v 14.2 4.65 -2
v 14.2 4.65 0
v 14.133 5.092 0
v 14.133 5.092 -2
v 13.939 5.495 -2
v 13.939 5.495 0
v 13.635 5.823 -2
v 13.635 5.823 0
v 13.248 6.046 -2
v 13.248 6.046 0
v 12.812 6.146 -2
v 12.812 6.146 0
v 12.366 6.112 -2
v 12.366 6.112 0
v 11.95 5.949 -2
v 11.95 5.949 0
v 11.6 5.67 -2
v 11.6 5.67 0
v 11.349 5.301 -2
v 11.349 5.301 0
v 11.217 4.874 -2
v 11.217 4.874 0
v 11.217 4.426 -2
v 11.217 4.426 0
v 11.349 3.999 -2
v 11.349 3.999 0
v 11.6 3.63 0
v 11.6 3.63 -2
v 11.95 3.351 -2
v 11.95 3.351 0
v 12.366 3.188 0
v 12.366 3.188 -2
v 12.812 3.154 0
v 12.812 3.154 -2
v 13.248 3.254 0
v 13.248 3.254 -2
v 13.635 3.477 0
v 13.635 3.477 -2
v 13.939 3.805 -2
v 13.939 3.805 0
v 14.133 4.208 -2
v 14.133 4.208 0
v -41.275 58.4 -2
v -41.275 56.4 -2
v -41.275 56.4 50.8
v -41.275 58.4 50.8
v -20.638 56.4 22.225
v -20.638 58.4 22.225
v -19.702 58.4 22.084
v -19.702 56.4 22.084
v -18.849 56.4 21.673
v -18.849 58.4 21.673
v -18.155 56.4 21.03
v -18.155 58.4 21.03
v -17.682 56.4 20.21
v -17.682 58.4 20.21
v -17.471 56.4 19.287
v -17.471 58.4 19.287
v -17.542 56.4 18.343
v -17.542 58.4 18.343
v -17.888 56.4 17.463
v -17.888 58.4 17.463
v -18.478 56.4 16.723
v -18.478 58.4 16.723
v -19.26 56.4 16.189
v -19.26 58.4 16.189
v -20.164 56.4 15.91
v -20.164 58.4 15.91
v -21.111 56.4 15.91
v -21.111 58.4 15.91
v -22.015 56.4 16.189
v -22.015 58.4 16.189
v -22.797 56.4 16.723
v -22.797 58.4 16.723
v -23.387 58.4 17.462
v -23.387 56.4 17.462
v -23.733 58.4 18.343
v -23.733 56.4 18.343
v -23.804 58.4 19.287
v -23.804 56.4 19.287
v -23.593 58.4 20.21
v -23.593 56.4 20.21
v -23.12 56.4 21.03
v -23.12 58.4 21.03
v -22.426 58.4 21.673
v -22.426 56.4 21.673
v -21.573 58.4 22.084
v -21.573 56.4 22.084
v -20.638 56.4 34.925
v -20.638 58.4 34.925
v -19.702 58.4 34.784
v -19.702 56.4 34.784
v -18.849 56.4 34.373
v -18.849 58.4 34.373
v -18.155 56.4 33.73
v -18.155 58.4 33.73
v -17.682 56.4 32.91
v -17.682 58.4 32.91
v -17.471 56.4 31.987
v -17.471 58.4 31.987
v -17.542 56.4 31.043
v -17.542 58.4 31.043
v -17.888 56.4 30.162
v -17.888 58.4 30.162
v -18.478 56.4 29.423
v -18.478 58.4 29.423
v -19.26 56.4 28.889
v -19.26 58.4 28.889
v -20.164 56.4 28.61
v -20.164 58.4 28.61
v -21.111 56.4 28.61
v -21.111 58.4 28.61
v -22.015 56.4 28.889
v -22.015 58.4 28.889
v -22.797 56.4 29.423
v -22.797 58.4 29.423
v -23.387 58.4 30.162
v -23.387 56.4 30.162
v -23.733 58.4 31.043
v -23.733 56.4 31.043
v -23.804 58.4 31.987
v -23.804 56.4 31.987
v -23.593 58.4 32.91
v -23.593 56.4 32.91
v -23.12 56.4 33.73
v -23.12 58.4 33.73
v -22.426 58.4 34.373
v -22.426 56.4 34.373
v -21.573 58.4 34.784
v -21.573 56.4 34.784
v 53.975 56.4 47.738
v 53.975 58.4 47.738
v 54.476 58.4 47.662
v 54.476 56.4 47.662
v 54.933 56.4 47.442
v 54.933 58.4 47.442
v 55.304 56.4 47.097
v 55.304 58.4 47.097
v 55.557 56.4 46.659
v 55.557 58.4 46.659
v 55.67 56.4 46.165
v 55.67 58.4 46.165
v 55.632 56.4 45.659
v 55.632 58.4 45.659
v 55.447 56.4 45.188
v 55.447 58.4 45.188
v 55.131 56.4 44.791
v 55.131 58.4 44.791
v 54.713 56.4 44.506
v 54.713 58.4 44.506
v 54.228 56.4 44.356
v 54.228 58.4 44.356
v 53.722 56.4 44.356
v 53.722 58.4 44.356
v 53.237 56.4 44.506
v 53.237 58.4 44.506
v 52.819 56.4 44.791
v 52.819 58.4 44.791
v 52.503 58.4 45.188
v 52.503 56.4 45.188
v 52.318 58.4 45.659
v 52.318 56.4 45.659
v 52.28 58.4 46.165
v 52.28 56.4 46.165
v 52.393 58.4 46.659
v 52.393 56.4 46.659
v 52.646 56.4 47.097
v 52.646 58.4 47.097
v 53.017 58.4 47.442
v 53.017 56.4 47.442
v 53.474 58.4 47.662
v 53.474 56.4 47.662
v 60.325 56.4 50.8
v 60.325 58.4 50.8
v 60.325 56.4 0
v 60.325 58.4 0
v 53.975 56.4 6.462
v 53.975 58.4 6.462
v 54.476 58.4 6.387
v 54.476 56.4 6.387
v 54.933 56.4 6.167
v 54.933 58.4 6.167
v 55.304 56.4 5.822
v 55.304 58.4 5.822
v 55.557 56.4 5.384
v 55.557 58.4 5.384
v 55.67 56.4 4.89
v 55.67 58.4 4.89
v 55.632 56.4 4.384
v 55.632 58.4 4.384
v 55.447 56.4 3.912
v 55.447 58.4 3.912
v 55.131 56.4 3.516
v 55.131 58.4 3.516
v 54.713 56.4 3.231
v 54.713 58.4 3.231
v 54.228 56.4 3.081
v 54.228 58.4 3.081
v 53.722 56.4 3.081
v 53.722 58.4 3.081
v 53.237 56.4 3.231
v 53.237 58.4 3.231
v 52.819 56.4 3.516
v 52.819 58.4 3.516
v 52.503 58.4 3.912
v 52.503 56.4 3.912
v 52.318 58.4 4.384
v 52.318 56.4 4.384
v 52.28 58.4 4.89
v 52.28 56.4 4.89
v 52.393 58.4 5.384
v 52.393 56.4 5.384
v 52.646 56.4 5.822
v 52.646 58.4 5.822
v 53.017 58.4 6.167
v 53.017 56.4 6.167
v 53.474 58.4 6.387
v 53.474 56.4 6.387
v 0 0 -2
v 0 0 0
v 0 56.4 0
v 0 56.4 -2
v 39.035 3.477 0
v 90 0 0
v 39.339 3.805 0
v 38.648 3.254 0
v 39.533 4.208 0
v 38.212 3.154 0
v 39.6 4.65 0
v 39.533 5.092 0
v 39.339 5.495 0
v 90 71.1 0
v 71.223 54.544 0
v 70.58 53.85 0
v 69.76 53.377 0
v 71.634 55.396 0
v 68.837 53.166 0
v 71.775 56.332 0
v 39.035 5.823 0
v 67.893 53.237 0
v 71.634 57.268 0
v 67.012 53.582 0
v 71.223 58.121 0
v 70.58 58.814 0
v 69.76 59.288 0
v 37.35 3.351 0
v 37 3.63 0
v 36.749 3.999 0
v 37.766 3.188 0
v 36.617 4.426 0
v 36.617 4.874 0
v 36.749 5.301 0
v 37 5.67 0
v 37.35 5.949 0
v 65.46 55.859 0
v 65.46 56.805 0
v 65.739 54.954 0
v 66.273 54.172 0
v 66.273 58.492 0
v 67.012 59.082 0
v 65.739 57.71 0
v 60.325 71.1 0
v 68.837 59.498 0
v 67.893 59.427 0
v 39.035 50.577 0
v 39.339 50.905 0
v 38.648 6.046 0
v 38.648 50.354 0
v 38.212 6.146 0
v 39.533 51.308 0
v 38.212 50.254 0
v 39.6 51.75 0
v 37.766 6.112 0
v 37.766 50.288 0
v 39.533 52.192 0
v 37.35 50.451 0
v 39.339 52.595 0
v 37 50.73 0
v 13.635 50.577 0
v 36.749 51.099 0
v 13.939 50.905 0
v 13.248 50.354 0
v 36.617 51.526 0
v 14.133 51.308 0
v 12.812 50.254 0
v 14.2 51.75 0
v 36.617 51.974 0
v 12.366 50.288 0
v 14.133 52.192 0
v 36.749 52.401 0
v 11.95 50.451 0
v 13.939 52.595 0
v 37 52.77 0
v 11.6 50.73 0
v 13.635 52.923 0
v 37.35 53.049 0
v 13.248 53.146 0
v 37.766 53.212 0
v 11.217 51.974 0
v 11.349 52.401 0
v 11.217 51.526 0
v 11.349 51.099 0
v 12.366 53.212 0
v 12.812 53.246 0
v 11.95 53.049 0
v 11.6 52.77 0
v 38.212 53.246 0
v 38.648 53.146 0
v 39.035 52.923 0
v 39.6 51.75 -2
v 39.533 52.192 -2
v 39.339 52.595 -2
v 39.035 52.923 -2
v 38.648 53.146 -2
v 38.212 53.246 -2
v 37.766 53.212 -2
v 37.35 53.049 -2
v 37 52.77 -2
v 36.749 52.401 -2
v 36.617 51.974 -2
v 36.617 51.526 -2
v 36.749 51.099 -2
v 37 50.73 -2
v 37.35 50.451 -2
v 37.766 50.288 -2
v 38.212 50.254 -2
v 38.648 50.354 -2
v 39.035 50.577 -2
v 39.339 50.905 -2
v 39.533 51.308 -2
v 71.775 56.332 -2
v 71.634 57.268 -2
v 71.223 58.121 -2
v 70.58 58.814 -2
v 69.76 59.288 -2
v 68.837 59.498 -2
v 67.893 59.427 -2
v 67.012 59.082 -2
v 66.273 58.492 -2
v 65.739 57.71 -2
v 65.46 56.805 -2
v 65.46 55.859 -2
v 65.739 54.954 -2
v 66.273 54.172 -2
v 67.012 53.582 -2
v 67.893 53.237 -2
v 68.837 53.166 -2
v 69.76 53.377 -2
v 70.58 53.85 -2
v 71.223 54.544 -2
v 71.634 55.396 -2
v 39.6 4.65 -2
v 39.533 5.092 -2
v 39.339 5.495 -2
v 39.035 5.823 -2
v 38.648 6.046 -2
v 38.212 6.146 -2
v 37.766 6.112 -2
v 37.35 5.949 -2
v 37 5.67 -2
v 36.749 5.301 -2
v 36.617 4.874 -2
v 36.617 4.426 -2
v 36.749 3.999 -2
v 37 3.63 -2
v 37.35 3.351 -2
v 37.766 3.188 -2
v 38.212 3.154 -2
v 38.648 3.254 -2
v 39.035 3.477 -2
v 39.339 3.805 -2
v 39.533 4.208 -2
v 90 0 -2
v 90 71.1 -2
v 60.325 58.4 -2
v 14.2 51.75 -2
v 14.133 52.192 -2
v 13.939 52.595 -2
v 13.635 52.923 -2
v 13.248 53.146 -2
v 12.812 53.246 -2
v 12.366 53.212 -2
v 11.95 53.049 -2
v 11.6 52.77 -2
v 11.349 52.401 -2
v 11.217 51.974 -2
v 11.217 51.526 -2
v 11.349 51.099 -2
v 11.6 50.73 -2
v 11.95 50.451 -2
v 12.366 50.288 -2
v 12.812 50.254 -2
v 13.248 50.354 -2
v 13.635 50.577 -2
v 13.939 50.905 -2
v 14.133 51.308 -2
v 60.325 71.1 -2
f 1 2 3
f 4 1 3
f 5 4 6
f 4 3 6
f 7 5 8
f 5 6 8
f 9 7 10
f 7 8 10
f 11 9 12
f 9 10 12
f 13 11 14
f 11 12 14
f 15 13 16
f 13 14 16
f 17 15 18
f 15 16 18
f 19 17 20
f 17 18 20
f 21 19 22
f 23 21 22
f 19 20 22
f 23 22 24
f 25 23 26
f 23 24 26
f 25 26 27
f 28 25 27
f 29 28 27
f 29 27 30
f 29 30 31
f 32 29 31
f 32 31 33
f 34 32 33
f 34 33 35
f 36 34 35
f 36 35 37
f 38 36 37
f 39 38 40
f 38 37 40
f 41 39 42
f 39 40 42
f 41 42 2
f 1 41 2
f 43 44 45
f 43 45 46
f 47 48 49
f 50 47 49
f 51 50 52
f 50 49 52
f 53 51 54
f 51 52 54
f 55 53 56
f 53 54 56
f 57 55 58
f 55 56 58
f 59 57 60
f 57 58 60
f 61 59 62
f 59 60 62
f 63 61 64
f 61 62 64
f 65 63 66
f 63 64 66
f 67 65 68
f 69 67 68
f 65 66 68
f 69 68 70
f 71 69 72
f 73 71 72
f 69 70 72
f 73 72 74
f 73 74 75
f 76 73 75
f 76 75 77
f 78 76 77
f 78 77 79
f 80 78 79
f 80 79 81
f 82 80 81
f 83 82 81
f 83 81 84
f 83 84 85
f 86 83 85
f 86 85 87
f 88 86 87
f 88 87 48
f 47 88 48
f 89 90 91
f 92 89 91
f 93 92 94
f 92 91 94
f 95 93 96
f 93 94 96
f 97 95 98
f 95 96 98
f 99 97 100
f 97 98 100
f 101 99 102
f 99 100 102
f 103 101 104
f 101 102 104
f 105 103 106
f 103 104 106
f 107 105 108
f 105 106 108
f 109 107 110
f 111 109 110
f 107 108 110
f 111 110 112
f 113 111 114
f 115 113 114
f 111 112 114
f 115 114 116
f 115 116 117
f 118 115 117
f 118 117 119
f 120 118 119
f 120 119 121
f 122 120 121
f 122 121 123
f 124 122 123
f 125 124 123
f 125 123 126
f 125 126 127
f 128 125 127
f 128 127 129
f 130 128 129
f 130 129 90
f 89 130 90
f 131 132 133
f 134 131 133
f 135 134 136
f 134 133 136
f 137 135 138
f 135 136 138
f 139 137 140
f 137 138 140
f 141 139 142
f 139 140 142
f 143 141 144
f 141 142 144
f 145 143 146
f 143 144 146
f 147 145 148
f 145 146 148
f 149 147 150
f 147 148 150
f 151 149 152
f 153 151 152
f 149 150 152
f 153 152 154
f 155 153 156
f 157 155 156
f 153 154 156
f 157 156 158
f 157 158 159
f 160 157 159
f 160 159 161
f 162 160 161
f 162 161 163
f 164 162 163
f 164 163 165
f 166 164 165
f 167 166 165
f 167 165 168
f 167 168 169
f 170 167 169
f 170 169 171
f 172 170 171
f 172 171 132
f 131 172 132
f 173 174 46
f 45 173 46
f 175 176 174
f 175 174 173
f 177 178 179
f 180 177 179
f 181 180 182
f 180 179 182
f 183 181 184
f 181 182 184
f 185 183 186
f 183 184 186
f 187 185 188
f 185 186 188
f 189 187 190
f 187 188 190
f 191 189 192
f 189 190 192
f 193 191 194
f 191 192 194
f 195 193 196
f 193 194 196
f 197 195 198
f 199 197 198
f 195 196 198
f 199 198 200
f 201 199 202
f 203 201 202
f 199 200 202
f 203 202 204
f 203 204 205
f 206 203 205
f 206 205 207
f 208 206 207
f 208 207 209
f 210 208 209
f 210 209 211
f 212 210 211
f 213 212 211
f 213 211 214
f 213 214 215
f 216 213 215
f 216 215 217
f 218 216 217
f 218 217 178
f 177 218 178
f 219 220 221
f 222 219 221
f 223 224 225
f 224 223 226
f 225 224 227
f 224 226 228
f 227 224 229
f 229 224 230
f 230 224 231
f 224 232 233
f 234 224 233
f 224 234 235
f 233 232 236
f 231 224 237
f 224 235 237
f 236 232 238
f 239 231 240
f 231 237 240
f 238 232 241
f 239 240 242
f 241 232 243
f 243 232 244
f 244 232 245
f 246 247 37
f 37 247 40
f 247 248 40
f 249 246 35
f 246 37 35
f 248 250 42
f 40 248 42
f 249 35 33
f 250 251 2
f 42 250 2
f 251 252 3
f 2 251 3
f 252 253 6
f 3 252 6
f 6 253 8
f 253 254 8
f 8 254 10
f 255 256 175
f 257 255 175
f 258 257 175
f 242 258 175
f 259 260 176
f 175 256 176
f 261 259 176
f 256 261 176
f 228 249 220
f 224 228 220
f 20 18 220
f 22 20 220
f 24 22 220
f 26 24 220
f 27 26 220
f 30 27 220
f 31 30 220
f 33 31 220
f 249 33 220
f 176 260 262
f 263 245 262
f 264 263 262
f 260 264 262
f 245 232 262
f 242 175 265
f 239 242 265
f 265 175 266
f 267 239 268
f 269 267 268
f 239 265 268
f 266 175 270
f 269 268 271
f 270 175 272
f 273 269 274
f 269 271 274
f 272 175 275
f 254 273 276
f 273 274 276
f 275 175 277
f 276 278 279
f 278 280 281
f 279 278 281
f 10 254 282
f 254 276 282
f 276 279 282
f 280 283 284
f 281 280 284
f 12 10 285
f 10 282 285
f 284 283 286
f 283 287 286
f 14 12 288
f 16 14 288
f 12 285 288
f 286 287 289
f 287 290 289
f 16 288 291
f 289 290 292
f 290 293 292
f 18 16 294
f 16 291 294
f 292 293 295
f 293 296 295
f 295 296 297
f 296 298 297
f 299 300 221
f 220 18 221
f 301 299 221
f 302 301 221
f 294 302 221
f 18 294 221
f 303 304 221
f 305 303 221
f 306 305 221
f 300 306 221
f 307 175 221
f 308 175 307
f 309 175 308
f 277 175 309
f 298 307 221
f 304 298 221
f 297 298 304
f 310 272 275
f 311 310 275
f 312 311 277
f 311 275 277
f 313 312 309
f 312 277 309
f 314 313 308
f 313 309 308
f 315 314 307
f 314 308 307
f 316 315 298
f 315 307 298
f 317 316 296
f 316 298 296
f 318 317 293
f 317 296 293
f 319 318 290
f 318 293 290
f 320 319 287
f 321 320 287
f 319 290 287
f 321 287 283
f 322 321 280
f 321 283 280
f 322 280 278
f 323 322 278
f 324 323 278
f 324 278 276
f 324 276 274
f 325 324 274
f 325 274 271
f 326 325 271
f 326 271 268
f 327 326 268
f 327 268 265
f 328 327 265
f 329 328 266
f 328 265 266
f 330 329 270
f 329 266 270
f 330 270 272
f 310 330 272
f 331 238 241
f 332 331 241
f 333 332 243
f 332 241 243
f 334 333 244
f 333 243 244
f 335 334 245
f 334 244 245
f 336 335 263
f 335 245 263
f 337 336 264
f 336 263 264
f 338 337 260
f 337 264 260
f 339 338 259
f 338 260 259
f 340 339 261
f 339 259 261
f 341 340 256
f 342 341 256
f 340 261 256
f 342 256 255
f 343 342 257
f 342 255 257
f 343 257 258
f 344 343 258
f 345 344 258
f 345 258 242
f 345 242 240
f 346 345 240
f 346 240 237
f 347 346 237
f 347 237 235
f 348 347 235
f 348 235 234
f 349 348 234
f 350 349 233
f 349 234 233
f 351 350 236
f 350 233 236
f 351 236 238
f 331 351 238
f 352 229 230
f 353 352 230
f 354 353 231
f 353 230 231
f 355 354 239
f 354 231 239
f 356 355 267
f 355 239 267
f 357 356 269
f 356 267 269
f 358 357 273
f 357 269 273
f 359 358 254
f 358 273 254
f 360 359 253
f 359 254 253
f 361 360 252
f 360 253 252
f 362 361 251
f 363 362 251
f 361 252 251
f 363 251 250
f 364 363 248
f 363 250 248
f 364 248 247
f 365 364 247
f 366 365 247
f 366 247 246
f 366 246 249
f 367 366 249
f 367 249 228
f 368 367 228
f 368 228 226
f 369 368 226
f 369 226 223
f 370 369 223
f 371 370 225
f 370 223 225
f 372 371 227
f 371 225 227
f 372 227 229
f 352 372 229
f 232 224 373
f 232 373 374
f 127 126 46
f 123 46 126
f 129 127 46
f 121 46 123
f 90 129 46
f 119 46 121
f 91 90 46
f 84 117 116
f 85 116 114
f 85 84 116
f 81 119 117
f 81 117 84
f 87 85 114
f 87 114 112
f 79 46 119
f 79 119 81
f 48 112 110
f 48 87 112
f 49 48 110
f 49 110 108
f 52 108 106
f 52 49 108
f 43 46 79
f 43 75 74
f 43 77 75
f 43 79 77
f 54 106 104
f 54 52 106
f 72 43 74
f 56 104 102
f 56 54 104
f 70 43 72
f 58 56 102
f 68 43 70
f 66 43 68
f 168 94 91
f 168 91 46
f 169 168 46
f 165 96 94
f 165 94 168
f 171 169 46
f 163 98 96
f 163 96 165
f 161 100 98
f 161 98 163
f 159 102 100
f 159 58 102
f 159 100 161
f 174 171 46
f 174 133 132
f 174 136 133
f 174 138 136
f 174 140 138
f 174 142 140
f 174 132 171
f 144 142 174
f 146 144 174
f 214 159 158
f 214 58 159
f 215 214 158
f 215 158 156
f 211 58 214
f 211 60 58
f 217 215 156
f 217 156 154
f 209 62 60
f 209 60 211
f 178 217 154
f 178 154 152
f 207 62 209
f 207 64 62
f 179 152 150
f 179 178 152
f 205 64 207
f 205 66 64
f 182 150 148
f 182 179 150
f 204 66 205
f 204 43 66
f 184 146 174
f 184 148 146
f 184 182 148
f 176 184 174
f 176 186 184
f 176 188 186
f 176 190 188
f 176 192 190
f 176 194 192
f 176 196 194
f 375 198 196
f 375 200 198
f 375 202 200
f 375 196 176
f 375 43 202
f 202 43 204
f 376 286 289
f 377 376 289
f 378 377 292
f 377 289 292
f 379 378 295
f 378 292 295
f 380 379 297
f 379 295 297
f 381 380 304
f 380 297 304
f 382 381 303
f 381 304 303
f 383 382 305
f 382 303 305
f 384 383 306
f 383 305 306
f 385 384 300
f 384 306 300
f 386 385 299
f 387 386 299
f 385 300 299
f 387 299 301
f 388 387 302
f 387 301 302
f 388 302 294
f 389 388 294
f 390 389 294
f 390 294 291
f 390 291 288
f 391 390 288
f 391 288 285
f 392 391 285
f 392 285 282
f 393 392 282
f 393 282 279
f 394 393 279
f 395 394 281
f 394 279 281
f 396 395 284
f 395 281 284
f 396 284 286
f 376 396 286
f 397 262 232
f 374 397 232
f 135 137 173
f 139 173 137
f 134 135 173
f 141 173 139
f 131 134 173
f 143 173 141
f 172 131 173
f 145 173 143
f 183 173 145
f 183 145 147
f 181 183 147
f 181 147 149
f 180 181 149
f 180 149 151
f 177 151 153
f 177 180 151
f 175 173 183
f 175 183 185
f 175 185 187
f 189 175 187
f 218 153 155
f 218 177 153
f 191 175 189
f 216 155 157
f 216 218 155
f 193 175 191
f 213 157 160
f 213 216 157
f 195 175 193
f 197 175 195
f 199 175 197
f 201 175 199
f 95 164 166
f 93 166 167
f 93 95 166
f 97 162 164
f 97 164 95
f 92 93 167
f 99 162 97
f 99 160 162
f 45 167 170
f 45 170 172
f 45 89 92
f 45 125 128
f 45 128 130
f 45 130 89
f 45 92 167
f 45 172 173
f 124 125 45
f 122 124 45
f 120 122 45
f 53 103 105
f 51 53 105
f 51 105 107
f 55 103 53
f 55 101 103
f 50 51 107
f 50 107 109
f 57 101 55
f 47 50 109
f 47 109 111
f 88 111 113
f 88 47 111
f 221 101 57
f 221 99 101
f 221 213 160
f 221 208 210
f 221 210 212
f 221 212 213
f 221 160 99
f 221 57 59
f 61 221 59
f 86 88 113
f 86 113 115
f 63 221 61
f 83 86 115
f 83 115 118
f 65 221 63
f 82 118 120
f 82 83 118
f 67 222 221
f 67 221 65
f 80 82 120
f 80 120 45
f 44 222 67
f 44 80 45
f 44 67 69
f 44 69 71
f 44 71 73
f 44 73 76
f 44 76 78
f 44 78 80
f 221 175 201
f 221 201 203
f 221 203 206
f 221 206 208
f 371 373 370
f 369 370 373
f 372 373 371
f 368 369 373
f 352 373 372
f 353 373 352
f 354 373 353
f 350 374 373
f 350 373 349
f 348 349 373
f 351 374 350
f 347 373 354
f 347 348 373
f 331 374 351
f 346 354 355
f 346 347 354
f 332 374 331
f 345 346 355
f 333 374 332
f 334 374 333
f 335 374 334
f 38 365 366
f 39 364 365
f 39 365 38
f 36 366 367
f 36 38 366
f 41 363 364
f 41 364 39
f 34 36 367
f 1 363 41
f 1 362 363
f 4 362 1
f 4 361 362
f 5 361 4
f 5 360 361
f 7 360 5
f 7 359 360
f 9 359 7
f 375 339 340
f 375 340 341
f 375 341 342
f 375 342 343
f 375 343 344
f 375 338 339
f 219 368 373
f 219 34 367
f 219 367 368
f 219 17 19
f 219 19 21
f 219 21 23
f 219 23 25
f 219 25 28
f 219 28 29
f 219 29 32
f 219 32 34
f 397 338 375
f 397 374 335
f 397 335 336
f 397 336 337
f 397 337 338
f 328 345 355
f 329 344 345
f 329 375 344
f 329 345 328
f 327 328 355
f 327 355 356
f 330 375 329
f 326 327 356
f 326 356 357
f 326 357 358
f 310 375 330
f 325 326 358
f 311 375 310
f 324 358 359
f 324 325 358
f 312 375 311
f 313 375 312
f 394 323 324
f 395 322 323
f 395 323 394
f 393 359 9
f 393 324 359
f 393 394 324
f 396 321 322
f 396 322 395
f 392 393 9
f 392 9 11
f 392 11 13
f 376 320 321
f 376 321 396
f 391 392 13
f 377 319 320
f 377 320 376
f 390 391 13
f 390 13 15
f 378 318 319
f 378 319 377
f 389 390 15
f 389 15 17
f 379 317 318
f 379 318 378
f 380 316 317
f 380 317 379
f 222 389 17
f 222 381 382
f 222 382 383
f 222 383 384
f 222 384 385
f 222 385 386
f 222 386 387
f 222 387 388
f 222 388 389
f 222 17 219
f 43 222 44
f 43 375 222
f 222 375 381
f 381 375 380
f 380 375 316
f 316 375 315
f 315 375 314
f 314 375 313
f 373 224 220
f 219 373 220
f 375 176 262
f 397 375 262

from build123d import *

# Parameters (mm, degrees)
SKETCH1_R           = 3.175
SKETCH1_R_2         = 1.5
BOSS_EXTRUDE1_DEPTH = 2
BOSS_EXTRUDE2_DEPTH = 52.8
SKETCH3_R           = 1.7
SKETCH3_R_2         = 3.175
CUT_EXTRUDE1_DEPTH  = 119.706360402


with BuildPart() as part:
    # Sketch1 → Boss-Extrude1 (new body)
    with BuildSketch(Plane.XY):
        Polygon((0, 58.4), (60.325, 58.4), (60.325, 71.1), (90, 71.1), (90, 58.4), (90, 0), (0, 0), align=None)
        with Locations((68.6, 56.33204182)):
            Circle(SKETCH1_R, mode=Mode.SUBTRACT)
        with Locations((12.7, 51.75)):
            Circle(SKETCH1_R_2, mode=Mode.SUBTRACT)
        with Locations((38.1, 51.75)):
            Circle(SKETCH1_R_2, mode=Mode.SUBTRACT)
        with Locations((12.7, 4.65)):
            Circle(SKETCH1_R_2, mode=Mode.SUBTRACT)
        with Locations((38.1, 4.65)):
            Circle(SKETCH1_R_2, mode=Mode.SUBTRACT)
    extrude(amount=-BOSS_EXTRUDE1_DEPTH)

    # Sketch2 → Boss-Extrude2 (add)
    with BuildSketch(Plane(origin=(0, 0, -2), x_dir=(-1, 0, 0), z_dir=(0, 0, -1))):
        Polygon((0, 56.4), (41.275, 56.4), (41.275, 58.4), (0, 58.4), (-60.325, 58.4), (-60.325, 56.4), align=None)
    extrude(amount=-BOSS_EXTRUDE2_DEPTH)

    # Sketch3 → Cut-Extrude1 (cut, through all)
    with BuildSketch(Plane(origin=(0, 58.4, 0), x_dir=(1, 0, 0), z_dir=(0, 1, 0))):
        with Locations(Location((53.975, -4.7625, 0), (0, 0, 270))):
            Circle(SKETCH3_R)
        with Locations(Location((53.975, -46.0375, 0), (0, 0, 270))):
            Circle(SKETCH3_R)
        with Locations(Location((-20.6375, -31.75, 0), (0, 0, 270))):
            Circle(SKETCH3_R_2)
        with Locations(Location((-20.6375, -19.05, 0), (0, 0, 270))):
            Circle(SKETCH3_R_2)
    extrude(amount=-CUT_EXTRUDE1_DEPTH, mode=Mode.SUBTRACT)


solid = part.part
